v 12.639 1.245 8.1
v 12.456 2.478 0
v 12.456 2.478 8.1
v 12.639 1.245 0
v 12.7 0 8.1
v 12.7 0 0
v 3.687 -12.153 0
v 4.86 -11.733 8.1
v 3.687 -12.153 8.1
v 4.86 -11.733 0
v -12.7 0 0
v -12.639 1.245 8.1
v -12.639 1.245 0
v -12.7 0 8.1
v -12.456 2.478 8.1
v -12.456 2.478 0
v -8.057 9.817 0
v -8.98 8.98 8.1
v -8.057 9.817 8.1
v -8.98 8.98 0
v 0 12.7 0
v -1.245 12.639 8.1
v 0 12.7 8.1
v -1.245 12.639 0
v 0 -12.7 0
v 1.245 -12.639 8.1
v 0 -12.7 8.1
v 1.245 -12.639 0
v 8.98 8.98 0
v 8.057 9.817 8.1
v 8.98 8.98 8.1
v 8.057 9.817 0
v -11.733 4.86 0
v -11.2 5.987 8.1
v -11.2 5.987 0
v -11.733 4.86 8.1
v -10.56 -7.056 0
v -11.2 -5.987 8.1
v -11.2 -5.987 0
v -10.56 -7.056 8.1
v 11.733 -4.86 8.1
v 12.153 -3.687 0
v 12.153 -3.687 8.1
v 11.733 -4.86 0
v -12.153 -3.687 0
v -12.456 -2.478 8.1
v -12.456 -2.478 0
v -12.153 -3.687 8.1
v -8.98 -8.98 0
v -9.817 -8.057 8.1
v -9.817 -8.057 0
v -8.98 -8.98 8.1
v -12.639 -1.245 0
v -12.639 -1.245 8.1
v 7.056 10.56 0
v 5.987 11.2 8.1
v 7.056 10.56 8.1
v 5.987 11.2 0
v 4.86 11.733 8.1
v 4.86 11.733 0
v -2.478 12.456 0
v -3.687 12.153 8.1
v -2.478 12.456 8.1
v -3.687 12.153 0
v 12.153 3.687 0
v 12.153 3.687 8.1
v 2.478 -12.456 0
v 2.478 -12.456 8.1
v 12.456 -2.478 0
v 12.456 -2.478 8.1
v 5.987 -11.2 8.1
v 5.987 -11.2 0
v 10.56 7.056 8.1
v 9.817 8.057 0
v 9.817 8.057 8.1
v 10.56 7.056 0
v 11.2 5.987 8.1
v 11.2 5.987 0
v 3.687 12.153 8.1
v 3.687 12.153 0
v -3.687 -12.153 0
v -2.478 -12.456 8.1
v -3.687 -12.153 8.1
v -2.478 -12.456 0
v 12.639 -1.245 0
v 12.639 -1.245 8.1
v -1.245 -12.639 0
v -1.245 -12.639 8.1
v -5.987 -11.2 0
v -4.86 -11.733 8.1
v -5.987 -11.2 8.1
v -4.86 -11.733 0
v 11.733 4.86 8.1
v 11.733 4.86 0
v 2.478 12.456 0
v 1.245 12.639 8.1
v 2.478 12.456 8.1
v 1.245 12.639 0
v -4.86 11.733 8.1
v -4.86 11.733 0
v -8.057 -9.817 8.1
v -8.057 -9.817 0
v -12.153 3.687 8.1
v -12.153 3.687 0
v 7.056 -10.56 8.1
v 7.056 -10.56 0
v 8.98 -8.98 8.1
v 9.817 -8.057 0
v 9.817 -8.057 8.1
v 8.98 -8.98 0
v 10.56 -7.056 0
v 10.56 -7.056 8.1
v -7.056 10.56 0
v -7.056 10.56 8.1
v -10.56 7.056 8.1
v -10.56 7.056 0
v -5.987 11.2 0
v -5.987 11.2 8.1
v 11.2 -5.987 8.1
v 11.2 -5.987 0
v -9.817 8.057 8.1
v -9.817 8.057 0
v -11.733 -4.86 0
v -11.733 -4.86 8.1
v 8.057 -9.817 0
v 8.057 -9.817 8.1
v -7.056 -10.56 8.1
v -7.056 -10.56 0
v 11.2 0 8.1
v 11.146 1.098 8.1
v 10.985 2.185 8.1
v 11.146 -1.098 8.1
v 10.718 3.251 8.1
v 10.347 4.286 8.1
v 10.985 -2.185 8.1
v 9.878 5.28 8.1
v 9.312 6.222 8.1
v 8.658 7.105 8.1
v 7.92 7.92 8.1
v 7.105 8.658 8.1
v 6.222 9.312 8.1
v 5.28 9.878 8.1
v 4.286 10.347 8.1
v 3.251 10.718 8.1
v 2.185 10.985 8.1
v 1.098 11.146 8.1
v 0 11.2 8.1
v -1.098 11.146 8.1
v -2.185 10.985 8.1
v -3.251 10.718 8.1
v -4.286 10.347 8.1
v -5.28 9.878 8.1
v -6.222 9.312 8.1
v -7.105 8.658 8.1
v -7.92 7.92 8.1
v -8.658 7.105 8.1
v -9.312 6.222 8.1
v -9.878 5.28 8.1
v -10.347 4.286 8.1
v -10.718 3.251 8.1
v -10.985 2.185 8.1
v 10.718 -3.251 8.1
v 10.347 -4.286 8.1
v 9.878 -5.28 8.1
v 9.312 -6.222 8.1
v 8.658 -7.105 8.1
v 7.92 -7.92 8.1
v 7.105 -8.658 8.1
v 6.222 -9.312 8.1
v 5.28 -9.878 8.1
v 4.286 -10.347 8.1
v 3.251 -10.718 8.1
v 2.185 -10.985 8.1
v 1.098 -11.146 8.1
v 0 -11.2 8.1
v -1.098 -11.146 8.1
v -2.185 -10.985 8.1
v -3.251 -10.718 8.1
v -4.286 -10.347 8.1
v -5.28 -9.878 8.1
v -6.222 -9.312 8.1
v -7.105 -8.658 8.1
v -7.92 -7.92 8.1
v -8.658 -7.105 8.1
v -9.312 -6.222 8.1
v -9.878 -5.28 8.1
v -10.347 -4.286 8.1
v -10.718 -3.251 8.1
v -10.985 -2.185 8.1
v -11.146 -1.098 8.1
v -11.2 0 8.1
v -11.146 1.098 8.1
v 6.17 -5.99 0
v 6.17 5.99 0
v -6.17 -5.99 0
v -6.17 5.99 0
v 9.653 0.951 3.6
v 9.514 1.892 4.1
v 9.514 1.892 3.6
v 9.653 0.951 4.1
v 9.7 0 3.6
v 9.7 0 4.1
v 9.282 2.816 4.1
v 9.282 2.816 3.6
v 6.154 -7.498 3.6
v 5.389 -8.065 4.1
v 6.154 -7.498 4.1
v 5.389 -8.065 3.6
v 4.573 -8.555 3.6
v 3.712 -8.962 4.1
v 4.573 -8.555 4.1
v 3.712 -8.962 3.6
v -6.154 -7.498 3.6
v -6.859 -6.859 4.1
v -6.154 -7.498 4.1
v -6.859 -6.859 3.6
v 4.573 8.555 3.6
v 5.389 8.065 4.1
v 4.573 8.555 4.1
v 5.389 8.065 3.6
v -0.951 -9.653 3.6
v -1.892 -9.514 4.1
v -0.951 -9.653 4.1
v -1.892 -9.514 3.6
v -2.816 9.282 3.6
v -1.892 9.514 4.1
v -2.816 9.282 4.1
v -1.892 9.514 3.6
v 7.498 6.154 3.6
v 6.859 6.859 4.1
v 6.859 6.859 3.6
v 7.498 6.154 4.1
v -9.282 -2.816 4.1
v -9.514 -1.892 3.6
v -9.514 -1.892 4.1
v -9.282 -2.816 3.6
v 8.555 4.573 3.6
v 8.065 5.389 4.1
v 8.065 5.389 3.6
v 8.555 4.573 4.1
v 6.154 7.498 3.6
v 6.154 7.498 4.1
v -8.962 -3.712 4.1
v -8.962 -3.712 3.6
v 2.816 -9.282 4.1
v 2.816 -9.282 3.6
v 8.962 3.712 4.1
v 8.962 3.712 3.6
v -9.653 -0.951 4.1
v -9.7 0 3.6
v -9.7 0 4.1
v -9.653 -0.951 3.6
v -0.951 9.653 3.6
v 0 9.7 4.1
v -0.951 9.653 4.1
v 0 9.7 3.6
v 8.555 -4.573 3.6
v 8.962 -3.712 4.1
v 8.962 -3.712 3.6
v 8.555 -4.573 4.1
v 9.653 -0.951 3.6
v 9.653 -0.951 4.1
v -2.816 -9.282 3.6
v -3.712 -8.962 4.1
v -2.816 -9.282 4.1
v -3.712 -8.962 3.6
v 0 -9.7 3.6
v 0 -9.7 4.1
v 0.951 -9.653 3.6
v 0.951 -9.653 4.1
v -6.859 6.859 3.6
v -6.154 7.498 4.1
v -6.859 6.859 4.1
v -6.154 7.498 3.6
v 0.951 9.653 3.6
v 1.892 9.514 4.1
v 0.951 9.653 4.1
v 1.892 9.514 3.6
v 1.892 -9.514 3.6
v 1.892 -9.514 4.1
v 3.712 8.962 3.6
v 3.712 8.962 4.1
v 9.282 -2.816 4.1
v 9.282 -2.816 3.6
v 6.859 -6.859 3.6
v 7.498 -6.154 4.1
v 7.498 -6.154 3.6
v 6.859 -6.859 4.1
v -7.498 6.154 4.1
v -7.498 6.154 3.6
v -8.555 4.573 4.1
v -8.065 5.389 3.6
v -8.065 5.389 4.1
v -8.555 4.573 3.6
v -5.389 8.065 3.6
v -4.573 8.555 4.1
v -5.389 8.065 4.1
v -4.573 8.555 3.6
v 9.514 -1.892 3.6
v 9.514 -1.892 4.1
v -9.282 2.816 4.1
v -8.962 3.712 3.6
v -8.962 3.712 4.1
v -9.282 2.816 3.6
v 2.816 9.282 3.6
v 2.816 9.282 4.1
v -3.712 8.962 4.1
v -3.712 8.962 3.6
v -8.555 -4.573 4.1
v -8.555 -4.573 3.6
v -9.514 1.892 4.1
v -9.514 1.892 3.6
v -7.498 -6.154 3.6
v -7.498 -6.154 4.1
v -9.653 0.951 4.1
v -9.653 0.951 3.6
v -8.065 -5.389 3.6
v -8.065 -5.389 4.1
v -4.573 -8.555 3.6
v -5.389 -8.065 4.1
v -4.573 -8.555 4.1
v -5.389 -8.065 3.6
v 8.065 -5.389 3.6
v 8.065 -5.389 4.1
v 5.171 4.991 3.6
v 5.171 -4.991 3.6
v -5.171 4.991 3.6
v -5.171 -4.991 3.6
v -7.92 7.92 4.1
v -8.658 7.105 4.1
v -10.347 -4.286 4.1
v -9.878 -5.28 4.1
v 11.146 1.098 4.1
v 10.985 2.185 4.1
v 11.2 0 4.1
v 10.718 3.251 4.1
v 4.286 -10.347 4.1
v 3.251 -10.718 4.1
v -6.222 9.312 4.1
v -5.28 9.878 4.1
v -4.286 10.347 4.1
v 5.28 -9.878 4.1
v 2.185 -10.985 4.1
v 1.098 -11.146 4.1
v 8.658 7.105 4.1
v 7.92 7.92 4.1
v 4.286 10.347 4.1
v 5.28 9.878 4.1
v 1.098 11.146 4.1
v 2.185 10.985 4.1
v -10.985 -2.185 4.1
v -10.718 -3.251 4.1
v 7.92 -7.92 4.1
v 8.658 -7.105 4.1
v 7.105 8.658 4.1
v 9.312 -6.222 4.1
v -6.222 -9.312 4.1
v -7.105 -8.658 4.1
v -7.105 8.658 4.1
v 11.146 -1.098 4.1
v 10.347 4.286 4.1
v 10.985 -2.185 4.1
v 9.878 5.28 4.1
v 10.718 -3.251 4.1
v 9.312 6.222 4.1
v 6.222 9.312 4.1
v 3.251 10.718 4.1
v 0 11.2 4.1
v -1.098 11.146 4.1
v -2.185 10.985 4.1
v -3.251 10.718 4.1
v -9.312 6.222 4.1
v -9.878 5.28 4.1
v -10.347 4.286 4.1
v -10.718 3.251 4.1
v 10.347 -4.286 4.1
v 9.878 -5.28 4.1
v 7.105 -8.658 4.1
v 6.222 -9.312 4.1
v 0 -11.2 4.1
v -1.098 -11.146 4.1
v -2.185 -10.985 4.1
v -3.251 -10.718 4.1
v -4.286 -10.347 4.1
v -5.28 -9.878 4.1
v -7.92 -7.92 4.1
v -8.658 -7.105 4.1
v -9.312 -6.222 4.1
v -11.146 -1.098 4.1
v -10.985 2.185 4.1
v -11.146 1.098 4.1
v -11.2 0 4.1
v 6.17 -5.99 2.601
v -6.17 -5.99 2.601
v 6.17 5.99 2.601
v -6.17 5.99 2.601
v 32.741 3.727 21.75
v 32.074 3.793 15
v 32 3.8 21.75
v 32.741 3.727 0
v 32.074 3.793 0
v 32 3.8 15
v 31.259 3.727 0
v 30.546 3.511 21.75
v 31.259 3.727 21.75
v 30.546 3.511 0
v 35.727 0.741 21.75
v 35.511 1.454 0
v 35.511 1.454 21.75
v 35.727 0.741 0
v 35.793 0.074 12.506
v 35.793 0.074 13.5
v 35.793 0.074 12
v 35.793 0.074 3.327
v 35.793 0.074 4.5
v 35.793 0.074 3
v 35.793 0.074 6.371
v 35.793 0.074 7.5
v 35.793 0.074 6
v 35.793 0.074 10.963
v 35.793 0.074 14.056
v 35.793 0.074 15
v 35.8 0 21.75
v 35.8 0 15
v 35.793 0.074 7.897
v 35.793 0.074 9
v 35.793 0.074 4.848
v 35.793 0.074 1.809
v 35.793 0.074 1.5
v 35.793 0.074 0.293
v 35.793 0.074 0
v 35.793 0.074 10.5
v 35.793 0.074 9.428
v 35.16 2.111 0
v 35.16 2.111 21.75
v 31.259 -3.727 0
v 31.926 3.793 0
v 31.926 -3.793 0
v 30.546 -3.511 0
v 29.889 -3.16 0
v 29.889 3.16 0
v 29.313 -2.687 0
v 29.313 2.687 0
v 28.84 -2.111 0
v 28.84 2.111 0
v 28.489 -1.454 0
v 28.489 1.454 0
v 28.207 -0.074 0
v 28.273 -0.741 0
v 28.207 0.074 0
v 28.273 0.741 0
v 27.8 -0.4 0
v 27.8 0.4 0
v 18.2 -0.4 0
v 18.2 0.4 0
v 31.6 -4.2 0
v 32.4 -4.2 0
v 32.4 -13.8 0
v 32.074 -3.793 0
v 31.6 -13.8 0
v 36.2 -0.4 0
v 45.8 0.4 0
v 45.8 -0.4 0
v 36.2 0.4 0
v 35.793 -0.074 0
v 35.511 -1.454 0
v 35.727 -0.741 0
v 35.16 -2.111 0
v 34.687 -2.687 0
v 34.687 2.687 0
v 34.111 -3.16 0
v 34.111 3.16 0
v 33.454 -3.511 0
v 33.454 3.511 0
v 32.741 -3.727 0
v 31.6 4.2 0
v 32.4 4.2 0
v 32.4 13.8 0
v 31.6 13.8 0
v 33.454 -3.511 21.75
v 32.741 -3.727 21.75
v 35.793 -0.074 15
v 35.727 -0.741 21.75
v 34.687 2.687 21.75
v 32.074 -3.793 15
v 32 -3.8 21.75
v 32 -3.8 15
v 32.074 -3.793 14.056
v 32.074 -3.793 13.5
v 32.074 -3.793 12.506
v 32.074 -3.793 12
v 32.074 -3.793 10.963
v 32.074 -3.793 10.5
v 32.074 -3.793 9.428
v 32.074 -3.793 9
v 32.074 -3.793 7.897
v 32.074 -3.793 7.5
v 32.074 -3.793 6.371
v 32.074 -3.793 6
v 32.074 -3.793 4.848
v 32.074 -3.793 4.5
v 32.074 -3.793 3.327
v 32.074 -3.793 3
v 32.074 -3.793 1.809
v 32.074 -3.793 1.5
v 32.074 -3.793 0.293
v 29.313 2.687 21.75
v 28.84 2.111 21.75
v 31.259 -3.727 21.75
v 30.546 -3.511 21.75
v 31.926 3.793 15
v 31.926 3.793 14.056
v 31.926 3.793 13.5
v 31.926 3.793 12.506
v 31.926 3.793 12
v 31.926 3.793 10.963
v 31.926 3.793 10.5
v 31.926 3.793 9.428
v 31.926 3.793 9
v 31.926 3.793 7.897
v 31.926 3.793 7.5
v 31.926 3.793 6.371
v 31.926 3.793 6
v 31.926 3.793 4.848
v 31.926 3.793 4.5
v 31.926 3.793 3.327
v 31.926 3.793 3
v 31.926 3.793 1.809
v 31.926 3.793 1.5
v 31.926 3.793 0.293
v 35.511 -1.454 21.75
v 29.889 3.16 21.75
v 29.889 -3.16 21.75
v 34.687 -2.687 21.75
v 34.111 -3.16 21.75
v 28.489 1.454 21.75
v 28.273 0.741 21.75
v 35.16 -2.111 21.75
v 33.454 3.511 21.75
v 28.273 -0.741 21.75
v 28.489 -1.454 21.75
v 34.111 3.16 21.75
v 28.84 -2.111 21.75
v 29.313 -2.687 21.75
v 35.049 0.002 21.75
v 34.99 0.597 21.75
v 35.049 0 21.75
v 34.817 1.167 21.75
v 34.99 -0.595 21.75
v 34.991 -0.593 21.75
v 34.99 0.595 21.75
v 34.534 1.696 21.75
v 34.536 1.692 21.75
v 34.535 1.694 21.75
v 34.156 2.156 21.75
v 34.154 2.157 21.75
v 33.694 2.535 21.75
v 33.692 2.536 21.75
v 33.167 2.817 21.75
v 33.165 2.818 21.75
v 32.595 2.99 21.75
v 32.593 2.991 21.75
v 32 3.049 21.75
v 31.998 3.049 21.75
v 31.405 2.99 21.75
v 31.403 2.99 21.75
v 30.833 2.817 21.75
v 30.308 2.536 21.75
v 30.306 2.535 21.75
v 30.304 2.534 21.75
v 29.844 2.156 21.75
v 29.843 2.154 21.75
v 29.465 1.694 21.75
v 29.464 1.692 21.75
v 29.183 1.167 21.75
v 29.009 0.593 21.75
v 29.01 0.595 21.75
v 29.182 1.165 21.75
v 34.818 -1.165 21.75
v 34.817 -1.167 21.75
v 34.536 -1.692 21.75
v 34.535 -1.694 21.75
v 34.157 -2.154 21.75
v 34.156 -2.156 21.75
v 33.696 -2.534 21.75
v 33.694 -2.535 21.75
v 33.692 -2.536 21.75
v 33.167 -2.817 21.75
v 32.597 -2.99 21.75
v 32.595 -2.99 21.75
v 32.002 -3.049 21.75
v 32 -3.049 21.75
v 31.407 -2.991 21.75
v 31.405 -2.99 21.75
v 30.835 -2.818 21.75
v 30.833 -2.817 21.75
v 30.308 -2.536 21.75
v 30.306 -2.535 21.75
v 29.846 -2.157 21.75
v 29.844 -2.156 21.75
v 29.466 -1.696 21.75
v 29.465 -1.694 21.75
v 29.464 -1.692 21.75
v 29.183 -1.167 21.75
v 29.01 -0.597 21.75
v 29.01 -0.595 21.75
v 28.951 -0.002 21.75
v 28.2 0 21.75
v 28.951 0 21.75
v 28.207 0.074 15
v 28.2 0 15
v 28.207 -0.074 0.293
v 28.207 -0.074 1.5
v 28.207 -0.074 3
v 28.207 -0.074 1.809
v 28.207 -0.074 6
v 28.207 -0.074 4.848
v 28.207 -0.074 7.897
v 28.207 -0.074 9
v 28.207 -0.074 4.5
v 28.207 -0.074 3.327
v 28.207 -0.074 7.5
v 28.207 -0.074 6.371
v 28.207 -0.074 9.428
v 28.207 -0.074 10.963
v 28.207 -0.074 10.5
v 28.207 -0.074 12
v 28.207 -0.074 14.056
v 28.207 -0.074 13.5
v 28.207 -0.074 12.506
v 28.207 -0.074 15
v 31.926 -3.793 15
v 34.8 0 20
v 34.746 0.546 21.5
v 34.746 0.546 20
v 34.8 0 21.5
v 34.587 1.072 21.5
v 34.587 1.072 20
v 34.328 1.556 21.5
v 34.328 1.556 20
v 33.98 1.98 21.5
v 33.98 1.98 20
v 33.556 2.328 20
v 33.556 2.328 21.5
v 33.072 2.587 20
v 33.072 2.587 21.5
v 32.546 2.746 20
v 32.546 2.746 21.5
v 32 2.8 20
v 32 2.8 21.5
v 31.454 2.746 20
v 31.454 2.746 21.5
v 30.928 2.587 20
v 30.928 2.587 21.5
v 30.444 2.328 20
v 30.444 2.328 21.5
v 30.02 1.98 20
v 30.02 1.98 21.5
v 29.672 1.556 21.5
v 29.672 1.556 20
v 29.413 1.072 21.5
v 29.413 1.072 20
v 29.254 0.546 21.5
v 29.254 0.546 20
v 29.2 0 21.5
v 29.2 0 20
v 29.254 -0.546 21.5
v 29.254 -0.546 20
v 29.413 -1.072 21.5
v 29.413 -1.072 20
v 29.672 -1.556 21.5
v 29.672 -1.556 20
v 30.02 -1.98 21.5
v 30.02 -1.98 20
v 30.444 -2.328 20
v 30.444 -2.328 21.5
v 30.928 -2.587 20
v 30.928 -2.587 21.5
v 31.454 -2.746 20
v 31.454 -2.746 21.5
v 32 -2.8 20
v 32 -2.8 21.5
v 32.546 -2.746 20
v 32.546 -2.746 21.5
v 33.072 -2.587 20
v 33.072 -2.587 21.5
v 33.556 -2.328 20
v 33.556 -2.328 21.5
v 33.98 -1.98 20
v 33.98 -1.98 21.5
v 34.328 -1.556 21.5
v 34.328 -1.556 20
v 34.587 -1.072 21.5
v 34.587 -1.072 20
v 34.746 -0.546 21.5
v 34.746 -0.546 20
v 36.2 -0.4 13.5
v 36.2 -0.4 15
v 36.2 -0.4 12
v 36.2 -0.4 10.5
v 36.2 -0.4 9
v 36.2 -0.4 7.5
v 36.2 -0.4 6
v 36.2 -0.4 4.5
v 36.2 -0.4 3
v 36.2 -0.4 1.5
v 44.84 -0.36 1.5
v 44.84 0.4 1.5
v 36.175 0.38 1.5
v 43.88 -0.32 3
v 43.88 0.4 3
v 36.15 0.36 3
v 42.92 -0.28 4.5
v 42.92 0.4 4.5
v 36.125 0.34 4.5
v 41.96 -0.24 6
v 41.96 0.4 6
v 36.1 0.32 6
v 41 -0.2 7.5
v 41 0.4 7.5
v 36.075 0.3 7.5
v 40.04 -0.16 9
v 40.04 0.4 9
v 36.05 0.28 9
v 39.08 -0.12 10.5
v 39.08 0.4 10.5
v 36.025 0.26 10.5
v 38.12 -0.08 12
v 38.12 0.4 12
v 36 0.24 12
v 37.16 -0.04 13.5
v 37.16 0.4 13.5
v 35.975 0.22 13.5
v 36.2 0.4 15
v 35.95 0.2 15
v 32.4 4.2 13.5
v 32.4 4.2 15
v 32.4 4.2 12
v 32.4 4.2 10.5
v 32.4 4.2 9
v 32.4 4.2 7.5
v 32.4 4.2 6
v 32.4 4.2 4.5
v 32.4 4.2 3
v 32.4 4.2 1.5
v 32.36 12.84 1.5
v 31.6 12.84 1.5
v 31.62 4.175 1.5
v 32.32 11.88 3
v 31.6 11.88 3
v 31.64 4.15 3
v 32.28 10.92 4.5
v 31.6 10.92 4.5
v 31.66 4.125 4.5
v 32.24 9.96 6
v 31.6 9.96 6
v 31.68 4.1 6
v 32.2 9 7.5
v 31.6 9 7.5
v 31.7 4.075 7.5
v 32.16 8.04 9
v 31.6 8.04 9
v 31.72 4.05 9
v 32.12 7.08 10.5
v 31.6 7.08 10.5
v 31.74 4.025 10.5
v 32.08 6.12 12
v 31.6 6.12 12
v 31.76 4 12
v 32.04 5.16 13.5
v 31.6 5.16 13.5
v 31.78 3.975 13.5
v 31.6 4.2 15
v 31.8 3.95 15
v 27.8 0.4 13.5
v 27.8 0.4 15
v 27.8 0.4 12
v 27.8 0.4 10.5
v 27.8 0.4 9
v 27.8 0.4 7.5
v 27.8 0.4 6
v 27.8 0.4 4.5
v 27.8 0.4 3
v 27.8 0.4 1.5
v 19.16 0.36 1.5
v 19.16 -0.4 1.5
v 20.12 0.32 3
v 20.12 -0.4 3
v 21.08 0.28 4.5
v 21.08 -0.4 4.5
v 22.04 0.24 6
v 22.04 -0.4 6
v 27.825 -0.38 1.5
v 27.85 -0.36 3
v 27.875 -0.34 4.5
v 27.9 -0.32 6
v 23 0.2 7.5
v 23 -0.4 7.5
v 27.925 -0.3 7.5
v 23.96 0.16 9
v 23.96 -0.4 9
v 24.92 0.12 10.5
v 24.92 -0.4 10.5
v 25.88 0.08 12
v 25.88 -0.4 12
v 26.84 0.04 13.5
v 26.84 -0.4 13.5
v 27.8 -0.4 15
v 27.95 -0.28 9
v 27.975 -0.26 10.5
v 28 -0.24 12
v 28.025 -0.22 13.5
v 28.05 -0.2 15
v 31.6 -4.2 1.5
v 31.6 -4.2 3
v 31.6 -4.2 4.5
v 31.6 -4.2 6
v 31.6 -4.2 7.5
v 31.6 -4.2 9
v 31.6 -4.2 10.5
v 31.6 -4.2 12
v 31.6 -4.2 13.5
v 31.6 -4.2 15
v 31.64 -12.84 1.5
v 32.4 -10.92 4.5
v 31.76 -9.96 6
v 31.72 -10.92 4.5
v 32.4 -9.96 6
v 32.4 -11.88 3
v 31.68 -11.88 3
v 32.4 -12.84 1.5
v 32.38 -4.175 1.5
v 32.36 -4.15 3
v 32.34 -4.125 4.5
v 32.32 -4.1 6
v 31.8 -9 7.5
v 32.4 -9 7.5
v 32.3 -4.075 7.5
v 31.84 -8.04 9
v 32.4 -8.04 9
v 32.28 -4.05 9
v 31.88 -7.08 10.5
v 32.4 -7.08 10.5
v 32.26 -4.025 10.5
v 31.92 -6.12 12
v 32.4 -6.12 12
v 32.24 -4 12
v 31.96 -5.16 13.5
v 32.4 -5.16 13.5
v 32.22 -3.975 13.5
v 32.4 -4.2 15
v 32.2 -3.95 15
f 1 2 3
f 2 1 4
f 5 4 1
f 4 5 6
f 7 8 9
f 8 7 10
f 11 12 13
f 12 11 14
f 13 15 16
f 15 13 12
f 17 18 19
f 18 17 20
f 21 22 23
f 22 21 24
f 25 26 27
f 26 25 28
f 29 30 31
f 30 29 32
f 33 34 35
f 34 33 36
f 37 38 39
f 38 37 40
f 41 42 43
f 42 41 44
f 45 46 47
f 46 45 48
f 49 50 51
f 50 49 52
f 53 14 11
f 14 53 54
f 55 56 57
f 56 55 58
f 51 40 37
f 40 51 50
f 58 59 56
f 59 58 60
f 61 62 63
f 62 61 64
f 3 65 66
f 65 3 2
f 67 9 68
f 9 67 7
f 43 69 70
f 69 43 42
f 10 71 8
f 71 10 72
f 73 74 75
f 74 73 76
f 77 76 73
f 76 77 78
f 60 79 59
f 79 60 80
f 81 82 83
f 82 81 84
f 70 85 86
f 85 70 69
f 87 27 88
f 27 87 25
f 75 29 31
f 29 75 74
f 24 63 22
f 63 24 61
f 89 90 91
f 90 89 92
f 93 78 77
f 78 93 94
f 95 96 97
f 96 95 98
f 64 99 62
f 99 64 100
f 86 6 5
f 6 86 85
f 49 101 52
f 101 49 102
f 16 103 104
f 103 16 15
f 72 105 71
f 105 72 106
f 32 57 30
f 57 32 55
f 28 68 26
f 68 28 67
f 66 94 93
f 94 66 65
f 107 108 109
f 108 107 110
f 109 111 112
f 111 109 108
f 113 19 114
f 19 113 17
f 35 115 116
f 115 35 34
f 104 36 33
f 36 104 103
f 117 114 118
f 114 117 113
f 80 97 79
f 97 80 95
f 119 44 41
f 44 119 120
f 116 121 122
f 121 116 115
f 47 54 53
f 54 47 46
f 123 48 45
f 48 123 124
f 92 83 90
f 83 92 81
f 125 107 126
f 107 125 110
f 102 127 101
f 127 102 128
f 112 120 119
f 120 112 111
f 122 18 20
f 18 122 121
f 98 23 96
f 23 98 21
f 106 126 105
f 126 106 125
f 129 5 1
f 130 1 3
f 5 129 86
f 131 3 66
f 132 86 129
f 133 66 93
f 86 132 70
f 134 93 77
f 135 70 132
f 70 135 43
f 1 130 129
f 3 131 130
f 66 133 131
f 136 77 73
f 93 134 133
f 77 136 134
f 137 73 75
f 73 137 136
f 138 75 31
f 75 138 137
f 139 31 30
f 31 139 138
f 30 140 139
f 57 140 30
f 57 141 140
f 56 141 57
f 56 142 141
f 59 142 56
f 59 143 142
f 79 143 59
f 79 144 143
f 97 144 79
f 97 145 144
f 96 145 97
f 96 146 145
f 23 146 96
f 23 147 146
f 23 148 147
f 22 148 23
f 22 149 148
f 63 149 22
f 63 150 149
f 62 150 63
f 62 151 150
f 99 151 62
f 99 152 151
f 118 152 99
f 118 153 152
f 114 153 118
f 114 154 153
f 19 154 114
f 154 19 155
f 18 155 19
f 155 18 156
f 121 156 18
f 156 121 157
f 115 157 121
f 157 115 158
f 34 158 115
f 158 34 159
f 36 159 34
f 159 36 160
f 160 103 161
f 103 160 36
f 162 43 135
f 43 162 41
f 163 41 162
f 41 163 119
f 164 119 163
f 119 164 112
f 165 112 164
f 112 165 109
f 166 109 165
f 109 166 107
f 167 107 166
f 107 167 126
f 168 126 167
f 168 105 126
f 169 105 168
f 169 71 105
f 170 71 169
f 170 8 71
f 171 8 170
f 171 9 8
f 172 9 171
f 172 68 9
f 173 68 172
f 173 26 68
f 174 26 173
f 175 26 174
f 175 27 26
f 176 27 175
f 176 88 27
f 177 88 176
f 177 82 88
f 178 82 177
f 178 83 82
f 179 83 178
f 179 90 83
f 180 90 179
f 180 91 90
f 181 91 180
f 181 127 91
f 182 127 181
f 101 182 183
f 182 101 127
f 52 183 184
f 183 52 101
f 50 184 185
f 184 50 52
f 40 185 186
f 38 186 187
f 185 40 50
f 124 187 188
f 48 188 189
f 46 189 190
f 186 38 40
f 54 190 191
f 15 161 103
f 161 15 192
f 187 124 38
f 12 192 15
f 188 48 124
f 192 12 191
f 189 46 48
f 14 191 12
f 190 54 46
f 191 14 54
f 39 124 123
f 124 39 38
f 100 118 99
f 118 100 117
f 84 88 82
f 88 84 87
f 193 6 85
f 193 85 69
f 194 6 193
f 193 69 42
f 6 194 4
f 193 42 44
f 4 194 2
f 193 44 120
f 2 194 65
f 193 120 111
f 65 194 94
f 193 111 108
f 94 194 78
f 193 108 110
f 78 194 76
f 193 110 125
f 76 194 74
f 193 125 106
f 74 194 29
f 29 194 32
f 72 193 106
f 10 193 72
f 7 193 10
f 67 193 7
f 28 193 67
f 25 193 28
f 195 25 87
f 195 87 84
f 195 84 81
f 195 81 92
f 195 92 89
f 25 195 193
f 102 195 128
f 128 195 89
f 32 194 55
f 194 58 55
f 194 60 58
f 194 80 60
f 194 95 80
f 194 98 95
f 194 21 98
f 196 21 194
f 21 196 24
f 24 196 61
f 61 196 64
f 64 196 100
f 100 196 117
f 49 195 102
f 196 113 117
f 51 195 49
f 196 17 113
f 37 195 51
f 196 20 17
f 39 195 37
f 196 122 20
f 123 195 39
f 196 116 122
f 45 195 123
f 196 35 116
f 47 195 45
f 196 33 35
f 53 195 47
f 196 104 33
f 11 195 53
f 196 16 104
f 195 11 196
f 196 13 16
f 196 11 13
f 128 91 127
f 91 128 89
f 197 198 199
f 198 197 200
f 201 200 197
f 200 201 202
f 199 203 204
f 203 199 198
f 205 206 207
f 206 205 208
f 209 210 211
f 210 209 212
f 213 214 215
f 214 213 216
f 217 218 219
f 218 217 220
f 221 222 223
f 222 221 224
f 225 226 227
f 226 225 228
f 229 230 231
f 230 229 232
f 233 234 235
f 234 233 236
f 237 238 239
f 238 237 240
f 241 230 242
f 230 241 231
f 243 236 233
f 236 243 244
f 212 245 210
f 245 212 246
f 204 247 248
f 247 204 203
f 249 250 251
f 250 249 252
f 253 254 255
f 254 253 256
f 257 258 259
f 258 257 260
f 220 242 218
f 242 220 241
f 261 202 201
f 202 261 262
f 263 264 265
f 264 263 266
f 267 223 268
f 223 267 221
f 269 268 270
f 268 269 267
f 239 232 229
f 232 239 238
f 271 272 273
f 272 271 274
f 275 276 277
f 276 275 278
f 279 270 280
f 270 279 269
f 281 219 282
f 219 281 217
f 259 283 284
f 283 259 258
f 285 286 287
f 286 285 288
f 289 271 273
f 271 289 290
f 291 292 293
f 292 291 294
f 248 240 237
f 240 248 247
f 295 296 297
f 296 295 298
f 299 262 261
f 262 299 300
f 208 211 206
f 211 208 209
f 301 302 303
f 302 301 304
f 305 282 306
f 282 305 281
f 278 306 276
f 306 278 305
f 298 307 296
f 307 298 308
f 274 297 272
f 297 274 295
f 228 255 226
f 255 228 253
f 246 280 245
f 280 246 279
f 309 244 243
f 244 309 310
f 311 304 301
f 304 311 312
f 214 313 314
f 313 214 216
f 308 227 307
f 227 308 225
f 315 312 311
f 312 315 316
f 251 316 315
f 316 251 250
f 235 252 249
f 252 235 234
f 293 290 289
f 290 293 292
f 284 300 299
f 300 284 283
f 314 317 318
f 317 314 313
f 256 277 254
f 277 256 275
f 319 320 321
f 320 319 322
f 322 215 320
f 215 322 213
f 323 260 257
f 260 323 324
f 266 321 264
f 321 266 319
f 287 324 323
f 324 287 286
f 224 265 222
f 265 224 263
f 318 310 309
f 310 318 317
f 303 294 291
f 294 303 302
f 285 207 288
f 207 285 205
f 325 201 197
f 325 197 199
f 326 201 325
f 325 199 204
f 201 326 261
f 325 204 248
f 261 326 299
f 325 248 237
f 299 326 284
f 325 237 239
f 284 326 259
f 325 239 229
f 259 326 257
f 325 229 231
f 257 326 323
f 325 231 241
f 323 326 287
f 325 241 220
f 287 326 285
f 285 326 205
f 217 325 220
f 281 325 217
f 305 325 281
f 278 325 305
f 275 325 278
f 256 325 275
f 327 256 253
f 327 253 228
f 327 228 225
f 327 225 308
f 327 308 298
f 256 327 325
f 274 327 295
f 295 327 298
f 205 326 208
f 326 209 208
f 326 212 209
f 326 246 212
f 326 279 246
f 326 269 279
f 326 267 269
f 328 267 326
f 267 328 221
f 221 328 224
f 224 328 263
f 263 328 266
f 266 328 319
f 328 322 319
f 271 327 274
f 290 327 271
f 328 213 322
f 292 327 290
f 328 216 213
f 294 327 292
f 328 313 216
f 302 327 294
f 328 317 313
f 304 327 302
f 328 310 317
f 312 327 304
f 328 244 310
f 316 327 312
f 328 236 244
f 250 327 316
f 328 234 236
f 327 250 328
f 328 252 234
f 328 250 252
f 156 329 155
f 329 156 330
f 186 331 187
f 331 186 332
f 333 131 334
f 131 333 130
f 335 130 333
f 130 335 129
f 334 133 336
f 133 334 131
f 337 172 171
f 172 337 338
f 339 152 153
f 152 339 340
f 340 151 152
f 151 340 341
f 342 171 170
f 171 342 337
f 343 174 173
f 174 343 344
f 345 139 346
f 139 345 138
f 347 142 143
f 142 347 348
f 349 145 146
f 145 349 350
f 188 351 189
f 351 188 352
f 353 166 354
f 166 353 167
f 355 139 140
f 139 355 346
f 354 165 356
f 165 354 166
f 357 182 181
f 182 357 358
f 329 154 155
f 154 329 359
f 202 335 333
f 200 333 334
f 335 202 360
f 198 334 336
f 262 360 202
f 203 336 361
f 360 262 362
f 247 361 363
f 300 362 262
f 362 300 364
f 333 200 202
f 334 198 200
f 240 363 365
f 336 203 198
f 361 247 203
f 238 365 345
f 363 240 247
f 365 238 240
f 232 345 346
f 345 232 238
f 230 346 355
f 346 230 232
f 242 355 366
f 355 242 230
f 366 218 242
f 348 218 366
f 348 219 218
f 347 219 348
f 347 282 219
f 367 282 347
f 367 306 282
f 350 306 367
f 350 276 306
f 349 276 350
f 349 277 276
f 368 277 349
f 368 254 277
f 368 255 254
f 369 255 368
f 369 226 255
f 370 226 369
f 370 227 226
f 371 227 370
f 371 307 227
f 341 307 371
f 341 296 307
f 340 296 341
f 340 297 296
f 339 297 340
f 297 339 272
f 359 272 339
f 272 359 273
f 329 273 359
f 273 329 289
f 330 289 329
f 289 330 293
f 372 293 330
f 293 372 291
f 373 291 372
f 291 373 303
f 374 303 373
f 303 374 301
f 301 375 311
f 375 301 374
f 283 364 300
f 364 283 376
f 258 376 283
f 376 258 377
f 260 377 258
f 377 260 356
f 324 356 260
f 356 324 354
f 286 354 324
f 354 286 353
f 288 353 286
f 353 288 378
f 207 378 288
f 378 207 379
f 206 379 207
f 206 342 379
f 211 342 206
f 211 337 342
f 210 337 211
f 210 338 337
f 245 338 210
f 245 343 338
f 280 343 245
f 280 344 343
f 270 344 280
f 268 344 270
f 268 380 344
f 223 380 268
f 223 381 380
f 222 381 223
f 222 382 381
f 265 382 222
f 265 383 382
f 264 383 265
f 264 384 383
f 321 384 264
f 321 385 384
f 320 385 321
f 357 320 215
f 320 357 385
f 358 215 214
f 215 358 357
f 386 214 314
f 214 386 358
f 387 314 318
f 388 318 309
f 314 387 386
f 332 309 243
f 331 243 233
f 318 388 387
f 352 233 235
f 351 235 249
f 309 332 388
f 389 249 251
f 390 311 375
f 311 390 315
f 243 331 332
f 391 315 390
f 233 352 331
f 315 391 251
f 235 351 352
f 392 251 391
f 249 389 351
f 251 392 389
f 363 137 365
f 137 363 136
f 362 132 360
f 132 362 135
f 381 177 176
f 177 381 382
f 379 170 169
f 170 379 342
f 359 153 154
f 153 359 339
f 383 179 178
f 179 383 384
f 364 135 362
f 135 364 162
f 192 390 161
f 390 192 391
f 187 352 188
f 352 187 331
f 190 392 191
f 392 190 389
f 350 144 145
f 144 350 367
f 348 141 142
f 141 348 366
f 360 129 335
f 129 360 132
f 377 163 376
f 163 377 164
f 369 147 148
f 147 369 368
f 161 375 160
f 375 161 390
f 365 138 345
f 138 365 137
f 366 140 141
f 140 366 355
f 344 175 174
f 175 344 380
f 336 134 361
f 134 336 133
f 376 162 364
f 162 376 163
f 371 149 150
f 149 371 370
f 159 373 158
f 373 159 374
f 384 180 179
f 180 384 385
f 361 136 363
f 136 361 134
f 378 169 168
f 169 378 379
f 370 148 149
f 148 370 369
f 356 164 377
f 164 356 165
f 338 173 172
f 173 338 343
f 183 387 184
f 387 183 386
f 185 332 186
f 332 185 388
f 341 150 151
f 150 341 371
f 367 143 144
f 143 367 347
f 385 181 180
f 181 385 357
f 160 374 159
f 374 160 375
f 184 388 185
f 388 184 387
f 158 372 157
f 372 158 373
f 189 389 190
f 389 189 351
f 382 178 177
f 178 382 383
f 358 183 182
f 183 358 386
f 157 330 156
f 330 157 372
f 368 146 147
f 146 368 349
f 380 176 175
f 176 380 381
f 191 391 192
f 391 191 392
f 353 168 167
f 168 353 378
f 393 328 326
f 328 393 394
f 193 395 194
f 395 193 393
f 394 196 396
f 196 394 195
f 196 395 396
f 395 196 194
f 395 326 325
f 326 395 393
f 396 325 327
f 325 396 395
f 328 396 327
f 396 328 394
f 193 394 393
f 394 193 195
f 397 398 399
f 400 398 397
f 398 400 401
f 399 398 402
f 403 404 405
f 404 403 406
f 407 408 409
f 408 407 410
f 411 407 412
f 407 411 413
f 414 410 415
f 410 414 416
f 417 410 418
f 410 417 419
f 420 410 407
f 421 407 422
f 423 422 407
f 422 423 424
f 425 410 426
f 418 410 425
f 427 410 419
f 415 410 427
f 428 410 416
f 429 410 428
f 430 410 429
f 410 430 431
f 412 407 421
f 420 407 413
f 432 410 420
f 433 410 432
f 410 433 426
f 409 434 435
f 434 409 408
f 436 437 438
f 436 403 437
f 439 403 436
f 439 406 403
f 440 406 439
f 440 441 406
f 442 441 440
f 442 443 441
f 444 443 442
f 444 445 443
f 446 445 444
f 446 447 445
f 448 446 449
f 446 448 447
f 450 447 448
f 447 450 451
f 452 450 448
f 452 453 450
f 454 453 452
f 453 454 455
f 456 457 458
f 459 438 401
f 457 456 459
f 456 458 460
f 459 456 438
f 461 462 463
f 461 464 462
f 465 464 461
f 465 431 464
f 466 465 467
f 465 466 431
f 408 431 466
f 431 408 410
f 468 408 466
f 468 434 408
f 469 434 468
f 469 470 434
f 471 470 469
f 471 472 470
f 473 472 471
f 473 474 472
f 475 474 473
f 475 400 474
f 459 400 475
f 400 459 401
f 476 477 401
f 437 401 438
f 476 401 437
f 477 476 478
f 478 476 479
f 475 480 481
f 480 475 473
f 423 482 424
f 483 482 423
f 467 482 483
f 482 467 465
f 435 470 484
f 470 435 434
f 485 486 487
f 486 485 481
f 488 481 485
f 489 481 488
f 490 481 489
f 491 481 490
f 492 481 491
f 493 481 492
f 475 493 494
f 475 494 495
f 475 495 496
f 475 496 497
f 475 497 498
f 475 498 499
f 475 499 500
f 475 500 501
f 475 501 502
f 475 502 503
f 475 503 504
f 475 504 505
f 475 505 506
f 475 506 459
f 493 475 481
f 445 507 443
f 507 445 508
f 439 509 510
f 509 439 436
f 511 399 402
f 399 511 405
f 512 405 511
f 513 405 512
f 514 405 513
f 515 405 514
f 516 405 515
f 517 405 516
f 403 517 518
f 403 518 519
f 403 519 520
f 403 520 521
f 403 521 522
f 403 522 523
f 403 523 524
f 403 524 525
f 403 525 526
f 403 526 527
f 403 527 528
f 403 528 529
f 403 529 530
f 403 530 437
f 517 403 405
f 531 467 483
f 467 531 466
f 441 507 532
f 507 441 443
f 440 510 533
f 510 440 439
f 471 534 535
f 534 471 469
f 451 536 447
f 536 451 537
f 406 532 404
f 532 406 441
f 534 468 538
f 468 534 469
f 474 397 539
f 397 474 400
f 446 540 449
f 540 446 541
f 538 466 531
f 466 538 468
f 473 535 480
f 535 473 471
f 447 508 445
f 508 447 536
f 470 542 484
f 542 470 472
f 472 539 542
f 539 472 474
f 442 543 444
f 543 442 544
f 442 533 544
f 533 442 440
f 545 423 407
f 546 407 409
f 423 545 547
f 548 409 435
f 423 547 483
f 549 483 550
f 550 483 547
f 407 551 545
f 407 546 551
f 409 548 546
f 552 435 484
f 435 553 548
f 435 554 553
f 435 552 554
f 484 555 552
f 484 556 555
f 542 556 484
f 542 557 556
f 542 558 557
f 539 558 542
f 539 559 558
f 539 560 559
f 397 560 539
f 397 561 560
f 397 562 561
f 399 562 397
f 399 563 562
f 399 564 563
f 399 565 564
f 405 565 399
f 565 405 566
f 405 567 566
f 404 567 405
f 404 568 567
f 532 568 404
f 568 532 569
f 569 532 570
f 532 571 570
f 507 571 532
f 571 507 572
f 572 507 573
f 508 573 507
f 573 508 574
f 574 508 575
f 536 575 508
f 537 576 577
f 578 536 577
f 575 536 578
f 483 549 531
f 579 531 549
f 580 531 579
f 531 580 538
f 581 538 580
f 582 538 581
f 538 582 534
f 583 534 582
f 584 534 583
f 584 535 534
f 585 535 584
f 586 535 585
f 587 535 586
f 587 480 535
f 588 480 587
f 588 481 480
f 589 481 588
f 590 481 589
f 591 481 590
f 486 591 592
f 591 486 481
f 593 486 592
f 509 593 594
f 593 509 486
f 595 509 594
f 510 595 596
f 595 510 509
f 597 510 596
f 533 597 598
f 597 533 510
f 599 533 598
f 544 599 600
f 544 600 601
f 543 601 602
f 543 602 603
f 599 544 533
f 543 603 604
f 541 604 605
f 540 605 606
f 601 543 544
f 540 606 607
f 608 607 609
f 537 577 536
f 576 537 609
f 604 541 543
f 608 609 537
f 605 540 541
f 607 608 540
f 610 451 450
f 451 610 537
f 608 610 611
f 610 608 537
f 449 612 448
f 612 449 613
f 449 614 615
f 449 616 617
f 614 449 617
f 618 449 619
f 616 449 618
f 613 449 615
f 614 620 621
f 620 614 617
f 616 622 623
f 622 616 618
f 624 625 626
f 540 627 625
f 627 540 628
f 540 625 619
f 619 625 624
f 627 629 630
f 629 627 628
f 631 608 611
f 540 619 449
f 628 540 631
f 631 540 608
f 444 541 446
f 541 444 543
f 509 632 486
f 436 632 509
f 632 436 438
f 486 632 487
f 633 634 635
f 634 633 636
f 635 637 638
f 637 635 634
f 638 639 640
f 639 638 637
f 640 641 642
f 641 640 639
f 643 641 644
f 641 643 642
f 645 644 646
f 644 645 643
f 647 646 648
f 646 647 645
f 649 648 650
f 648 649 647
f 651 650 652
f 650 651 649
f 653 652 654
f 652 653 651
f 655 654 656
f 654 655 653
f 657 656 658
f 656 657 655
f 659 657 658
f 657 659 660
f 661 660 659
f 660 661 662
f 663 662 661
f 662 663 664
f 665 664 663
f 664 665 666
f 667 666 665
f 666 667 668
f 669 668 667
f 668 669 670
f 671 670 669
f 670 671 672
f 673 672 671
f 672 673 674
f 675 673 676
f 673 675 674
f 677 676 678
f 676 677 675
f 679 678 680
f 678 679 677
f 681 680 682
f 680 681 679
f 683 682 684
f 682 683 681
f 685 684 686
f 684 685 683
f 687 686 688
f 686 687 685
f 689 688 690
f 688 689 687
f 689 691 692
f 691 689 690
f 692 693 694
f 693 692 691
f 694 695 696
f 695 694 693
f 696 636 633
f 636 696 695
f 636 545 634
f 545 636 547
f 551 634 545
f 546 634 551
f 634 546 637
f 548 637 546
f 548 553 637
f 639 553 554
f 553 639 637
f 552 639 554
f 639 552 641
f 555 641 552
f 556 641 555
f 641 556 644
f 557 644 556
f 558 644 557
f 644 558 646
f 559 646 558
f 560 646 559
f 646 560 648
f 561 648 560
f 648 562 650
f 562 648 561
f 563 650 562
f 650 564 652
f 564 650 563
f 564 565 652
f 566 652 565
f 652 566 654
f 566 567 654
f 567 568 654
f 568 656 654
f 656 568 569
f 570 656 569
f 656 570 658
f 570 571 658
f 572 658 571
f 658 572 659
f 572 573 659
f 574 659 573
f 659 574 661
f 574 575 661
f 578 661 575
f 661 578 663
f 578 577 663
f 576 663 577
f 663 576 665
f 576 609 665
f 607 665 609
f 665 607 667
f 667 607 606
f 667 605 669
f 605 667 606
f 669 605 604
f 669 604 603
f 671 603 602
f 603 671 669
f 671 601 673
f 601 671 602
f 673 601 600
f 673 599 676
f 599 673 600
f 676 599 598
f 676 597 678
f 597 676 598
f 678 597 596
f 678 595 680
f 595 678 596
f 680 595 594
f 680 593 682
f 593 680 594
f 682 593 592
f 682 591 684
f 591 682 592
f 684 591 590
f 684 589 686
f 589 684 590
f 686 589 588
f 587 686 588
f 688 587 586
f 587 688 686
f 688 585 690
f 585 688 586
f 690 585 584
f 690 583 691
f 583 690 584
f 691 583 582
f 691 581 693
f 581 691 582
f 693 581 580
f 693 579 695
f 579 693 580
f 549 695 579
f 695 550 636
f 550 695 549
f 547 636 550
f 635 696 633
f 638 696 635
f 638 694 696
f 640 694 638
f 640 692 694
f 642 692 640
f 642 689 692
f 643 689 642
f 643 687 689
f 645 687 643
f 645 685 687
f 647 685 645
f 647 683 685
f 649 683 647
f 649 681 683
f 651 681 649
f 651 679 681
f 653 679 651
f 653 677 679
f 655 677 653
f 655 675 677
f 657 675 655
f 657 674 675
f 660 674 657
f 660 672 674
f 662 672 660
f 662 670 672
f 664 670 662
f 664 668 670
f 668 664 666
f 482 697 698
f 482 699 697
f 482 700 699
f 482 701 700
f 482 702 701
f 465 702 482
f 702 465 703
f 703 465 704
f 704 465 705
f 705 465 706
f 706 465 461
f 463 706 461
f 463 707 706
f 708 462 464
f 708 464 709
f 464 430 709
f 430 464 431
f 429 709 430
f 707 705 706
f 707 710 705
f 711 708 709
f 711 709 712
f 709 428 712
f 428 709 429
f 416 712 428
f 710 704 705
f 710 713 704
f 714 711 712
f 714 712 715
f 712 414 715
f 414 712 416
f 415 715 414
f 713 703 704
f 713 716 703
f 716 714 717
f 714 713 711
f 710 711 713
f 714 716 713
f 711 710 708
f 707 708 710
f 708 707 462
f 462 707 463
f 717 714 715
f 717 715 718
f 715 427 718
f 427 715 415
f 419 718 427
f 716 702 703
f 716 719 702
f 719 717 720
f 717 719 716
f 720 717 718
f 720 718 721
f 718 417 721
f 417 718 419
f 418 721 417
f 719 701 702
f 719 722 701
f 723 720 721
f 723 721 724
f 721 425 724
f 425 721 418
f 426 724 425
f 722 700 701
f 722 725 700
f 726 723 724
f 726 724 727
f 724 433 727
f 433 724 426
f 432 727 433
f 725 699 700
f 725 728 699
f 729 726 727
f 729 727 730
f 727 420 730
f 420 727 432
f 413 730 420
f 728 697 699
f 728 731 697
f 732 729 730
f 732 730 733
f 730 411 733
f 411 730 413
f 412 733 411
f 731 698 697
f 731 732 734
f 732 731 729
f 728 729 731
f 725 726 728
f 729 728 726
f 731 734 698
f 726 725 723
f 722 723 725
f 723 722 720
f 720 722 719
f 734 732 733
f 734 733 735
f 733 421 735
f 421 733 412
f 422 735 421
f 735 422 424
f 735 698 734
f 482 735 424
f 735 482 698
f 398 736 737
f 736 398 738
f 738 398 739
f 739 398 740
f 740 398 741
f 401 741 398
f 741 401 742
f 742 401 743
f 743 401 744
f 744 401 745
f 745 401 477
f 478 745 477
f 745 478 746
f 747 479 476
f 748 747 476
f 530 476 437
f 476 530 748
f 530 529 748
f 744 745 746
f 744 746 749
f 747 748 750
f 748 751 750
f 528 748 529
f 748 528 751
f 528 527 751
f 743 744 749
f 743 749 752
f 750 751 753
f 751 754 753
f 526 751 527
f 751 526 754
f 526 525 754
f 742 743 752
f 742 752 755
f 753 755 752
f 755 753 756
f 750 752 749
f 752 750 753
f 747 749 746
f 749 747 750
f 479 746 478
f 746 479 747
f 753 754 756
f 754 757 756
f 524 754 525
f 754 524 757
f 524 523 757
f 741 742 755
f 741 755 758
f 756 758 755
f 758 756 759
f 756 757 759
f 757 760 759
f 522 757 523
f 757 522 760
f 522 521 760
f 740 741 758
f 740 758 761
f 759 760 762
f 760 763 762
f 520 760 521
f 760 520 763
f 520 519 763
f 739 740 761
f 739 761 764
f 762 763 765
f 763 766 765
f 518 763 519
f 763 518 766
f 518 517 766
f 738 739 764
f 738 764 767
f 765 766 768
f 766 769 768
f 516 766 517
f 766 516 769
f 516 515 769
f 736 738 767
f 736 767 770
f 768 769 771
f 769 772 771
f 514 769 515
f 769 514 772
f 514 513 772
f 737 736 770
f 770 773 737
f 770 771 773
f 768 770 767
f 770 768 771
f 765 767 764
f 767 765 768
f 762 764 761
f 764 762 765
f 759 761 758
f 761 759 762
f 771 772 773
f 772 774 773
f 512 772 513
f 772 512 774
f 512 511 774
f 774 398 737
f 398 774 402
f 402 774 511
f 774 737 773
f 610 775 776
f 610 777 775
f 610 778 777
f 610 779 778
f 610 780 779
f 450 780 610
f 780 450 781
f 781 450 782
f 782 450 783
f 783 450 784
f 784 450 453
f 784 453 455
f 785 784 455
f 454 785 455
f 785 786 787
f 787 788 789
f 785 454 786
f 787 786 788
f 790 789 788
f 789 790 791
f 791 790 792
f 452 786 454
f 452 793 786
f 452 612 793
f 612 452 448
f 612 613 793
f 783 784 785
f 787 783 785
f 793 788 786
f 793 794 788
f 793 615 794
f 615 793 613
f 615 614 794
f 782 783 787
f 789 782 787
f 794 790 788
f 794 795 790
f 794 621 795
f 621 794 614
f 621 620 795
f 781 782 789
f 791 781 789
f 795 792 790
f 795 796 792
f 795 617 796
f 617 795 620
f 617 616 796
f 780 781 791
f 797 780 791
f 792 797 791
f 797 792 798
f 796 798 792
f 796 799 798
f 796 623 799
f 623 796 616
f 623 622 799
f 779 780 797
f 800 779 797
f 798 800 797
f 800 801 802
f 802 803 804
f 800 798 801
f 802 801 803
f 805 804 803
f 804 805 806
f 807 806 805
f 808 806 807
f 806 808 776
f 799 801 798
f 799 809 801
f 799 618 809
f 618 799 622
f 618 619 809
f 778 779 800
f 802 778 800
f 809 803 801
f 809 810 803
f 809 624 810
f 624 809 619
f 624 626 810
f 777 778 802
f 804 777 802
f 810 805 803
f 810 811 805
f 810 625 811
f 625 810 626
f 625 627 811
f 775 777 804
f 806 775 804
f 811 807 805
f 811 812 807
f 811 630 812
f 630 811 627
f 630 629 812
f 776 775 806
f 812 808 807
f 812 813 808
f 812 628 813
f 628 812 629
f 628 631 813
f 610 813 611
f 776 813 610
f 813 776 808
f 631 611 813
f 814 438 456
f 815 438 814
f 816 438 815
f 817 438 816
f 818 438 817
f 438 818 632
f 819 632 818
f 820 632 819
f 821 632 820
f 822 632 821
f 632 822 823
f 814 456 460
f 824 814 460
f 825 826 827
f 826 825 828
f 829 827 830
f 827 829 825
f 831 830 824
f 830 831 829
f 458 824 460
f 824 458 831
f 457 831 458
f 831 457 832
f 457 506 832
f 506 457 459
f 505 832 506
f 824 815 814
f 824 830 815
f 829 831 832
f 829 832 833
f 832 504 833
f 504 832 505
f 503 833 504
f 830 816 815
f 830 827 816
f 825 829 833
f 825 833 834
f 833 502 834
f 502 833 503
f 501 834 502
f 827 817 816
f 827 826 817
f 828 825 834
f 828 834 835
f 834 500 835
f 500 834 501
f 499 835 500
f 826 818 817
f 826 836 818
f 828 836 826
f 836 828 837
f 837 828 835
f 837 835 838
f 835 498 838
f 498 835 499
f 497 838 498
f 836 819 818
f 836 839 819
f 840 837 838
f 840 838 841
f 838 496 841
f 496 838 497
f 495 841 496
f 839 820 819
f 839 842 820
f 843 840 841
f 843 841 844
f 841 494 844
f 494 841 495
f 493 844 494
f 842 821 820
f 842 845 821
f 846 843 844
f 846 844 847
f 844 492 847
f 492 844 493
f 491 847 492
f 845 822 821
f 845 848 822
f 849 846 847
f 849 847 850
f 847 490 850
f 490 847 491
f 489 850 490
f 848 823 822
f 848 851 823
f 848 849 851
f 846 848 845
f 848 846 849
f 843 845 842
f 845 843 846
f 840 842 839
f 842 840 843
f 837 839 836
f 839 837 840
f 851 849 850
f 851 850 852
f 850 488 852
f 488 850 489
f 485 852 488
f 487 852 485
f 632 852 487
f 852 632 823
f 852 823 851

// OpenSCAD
use <tubemesh.scad>;

bearingID = 8;
//bearingThickness = 7;
bearingOD = 22;
bearingCollarHeight = 4;

pcbSizeX = 11.94;
pcbSizeY = 11.58;
pcbThickness = 1.6;
bottomExtraThickness = 1;

icThickness = 1.54;

verticalOffset = 1.5;
bevel = 1;

magnetDiameter = 6;
//magnetThickness = 2.5;
magnetCollarHeight = 1.75;
magnetCollarBevel = 0.25;
shaftLength = 20;
shaftSupports = true;

tolerance = 0.2;

wall = 1.5;


module dummy() {}

pcbThickness1 = pcbThickness+bottomExtraThickness;

nudge = 0.001;
height = bearingCollarHeight+verticalOffset+pcbThickness1;

// this is xy-centered for convenience
module topBeveledCube(size, bevel=1) {
    function section(xSize, ySize, zPos) = 
        [ [xSize/2,-ySize/2,zPos],
          [xSize/2,ySize/2,zPos],
          [-xSize/2,ySize/2,zPos],
          [-xSize/2,-ySize/2,zPos ] ];
    
    tubeMesh([
        section(size[0],size[1],0),
        section(size[0],size[1],size[2]-bevel),
        section(size[0]-bevel*2,size[1]-bevel*2,size[2])]);
}

module bottom() {
    $fn = 64;
    render(convexity=2)
    difference() {
        cylinder(d=bearingOD+2*wall+2*tolerance, h=height);
        translate([0,0,pcbThickness1+bevel]) cylinder(d=bearingOD+2*tolerance-2*wall, h=height);
        translate([0,0,height-bearingCollarHeight]) cylinder(d=bearingOD+2*tolerance, h=bearingCollarHeight+nudge);
        translate([0,0,-nudge])
        topBeveledCube([pcbSizeX+2*tolerance,pcbSizeY+2*tolerance,pcbThickness1+bevel+2*nudge], bevel=bevel);
    }
}

module top(supports=false) {
    $fn = 32;
    od = bearingID-2*tolerance;
    render(convexity=2)
    difference() {
        cylinder(d=od,h=shaftLength+magnetCollarHeight);
        tubeMesh([ngonPoints(n=$fn,d=magnetDiameter-2*tolerance,z=shaftLength),
        ngonPoints(n=$fn,d=magnetDiameter-2*tolerance,z=shaftLength+magnetCollarHeight-magnetCollarBevel),
        ngonPoints(n=$fn,d=magnetDiameter-2*tolerance+2*magnetCollarBevel,z=shaftLength+magnetCollarHeight+nudge)]);
    }
    if (supports) {
        x = od/2;
        for (angle=[0:90:360-90]) rotate([0,0,angle]) {
            
            morphExtrude([ 
                [ x-.1, 0, 0],
                [ x+.4, -.4, 0],
                [ x+10, -.4, 0],
                [ x+10, .4, 0],
                [ x+.4, .4, 0] ],
                [ [ x-.1, 0, shaftLength-5],
                  [ x+.4, -.4, shaftLength-5],
                  [ x+.4, .4, shaftLength-5] ]);                
        }
    }
}

bottom();
translate([10+bearingOD,0,0]) 
top(supports=shaftSupports);
